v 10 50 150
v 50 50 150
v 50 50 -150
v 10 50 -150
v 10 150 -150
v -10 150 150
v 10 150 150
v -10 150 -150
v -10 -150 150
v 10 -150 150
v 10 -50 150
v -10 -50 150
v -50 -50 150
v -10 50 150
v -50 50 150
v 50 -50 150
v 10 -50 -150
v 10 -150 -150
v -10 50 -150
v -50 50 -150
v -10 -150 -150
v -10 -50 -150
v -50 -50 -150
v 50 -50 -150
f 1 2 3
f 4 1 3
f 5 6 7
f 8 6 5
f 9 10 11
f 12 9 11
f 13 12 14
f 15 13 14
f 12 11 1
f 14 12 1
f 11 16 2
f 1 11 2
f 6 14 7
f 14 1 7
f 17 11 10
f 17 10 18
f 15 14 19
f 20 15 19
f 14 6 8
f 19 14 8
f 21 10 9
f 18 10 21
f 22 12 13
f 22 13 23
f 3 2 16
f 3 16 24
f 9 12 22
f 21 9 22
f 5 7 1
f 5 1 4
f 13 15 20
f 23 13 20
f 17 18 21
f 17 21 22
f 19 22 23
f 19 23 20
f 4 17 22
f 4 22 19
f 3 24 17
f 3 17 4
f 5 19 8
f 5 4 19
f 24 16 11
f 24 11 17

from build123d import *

# Parameters (mm, degrees)
SKETCH3_W           = 300
SKETCH3_H           = 100
BOSS_EXTRUDE3_DEPTH = 50
SKETCH3_4_W         = 300
SKETCH3_4_H         = 100
BOSS_EXTRUDE4_DEPTH = 10


with BuildPart() as part:
    # Sketch3 → Boss-Extrude3 (new, symmetric)
    with BuildSketch(Plane(origin=(0, 0, 0), x_dir=(0, 0, -1), z_dir=(1, 0, 0))):
        Rectangle(SKETCH3_W, SKETCH3_H)
    extrude(amount=BOSS_EXTRUDE3_DEPTH, both=True)

    # Sketch3<4> → Boss-Extrude4 (add, symmetric)
    with BuildSketch(Plane(origin=(0, 0, 0), x_dir=(0, 0, -1), z_dir=(1, 0, 0))):
        with Locations((0, 100)):
            Rectangle(SKETCH3_4_W, SKETCH3_4_H)
        with Locations((0, -100)):
            Rectangle(SKETCH3_4_W, SKETCH3_4_H)
    extrude(amount=BOSS_EXTRUDE4_DEPTH, both=True)


solid = part.part
